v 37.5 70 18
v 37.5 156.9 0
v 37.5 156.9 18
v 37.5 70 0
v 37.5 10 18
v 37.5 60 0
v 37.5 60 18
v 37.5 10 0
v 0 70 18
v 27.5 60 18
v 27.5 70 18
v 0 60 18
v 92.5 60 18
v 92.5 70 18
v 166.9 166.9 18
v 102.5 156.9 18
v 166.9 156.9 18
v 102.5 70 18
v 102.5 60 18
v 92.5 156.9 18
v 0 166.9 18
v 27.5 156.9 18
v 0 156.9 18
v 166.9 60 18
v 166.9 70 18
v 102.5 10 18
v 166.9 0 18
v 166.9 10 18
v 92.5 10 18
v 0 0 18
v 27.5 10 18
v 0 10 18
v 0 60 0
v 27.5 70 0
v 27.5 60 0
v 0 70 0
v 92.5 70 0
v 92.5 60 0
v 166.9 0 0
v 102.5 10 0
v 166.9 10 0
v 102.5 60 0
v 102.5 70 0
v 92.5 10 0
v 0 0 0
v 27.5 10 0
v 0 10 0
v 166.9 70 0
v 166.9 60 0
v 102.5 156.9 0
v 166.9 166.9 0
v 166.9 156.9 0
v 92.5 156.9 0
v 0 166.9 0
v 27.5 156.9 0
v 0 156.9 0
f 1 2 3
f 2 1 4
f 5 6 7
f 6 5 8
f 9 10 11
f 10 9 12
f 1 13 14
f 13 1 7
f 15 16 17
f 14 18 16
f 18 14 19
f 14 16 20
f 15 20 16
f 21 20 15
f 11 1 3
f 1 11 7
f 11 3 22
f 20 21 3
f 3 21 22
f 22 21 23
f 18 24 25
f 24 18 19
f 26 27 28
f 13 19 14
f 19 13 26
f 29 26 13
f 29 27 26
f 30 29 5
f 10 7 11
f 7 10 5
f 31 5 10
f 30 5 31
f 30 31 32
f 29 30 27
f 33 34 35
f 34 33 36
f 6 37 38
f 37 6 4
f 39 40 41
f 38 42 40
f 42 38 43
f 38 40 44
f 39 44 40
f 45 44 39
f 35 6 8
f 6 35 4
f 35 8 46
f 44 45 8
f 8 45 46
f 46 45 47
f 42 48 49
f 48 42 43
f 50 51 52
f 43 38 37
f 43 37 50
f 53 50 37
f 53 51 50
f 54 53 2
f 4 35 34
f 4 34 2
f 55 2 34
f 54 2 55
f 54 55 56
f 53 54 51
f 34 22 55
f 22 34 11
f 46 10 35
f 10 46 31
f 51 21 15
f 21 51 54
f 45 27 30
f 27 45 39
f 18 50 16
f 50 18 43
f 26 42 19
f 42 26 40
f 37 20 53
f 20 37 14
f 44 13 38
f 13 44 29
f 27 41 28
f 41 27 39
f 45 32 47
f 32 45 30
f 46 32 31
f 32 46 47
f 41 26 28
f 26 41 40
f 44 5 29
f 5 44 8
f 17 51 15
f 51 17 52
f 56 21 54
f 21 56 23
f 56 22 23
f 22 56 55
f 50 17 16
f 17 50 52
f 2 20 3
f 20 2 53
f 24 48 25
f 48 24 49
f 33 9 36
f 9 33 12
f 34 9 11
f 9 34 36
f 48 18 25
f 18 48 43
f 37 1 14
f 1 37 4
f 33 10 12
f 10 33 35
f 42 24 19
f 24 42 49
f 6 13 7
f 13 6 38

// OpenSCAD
/*
Wall spacer ladder.
Print orientation: print flat as shown. During assembly it stands between the outer
skin and inner liner to set the foam gap.
Quantity: one per wall tile sandwich.
*/

use <../planter_support_free.scad>

export_wall_spacer();
